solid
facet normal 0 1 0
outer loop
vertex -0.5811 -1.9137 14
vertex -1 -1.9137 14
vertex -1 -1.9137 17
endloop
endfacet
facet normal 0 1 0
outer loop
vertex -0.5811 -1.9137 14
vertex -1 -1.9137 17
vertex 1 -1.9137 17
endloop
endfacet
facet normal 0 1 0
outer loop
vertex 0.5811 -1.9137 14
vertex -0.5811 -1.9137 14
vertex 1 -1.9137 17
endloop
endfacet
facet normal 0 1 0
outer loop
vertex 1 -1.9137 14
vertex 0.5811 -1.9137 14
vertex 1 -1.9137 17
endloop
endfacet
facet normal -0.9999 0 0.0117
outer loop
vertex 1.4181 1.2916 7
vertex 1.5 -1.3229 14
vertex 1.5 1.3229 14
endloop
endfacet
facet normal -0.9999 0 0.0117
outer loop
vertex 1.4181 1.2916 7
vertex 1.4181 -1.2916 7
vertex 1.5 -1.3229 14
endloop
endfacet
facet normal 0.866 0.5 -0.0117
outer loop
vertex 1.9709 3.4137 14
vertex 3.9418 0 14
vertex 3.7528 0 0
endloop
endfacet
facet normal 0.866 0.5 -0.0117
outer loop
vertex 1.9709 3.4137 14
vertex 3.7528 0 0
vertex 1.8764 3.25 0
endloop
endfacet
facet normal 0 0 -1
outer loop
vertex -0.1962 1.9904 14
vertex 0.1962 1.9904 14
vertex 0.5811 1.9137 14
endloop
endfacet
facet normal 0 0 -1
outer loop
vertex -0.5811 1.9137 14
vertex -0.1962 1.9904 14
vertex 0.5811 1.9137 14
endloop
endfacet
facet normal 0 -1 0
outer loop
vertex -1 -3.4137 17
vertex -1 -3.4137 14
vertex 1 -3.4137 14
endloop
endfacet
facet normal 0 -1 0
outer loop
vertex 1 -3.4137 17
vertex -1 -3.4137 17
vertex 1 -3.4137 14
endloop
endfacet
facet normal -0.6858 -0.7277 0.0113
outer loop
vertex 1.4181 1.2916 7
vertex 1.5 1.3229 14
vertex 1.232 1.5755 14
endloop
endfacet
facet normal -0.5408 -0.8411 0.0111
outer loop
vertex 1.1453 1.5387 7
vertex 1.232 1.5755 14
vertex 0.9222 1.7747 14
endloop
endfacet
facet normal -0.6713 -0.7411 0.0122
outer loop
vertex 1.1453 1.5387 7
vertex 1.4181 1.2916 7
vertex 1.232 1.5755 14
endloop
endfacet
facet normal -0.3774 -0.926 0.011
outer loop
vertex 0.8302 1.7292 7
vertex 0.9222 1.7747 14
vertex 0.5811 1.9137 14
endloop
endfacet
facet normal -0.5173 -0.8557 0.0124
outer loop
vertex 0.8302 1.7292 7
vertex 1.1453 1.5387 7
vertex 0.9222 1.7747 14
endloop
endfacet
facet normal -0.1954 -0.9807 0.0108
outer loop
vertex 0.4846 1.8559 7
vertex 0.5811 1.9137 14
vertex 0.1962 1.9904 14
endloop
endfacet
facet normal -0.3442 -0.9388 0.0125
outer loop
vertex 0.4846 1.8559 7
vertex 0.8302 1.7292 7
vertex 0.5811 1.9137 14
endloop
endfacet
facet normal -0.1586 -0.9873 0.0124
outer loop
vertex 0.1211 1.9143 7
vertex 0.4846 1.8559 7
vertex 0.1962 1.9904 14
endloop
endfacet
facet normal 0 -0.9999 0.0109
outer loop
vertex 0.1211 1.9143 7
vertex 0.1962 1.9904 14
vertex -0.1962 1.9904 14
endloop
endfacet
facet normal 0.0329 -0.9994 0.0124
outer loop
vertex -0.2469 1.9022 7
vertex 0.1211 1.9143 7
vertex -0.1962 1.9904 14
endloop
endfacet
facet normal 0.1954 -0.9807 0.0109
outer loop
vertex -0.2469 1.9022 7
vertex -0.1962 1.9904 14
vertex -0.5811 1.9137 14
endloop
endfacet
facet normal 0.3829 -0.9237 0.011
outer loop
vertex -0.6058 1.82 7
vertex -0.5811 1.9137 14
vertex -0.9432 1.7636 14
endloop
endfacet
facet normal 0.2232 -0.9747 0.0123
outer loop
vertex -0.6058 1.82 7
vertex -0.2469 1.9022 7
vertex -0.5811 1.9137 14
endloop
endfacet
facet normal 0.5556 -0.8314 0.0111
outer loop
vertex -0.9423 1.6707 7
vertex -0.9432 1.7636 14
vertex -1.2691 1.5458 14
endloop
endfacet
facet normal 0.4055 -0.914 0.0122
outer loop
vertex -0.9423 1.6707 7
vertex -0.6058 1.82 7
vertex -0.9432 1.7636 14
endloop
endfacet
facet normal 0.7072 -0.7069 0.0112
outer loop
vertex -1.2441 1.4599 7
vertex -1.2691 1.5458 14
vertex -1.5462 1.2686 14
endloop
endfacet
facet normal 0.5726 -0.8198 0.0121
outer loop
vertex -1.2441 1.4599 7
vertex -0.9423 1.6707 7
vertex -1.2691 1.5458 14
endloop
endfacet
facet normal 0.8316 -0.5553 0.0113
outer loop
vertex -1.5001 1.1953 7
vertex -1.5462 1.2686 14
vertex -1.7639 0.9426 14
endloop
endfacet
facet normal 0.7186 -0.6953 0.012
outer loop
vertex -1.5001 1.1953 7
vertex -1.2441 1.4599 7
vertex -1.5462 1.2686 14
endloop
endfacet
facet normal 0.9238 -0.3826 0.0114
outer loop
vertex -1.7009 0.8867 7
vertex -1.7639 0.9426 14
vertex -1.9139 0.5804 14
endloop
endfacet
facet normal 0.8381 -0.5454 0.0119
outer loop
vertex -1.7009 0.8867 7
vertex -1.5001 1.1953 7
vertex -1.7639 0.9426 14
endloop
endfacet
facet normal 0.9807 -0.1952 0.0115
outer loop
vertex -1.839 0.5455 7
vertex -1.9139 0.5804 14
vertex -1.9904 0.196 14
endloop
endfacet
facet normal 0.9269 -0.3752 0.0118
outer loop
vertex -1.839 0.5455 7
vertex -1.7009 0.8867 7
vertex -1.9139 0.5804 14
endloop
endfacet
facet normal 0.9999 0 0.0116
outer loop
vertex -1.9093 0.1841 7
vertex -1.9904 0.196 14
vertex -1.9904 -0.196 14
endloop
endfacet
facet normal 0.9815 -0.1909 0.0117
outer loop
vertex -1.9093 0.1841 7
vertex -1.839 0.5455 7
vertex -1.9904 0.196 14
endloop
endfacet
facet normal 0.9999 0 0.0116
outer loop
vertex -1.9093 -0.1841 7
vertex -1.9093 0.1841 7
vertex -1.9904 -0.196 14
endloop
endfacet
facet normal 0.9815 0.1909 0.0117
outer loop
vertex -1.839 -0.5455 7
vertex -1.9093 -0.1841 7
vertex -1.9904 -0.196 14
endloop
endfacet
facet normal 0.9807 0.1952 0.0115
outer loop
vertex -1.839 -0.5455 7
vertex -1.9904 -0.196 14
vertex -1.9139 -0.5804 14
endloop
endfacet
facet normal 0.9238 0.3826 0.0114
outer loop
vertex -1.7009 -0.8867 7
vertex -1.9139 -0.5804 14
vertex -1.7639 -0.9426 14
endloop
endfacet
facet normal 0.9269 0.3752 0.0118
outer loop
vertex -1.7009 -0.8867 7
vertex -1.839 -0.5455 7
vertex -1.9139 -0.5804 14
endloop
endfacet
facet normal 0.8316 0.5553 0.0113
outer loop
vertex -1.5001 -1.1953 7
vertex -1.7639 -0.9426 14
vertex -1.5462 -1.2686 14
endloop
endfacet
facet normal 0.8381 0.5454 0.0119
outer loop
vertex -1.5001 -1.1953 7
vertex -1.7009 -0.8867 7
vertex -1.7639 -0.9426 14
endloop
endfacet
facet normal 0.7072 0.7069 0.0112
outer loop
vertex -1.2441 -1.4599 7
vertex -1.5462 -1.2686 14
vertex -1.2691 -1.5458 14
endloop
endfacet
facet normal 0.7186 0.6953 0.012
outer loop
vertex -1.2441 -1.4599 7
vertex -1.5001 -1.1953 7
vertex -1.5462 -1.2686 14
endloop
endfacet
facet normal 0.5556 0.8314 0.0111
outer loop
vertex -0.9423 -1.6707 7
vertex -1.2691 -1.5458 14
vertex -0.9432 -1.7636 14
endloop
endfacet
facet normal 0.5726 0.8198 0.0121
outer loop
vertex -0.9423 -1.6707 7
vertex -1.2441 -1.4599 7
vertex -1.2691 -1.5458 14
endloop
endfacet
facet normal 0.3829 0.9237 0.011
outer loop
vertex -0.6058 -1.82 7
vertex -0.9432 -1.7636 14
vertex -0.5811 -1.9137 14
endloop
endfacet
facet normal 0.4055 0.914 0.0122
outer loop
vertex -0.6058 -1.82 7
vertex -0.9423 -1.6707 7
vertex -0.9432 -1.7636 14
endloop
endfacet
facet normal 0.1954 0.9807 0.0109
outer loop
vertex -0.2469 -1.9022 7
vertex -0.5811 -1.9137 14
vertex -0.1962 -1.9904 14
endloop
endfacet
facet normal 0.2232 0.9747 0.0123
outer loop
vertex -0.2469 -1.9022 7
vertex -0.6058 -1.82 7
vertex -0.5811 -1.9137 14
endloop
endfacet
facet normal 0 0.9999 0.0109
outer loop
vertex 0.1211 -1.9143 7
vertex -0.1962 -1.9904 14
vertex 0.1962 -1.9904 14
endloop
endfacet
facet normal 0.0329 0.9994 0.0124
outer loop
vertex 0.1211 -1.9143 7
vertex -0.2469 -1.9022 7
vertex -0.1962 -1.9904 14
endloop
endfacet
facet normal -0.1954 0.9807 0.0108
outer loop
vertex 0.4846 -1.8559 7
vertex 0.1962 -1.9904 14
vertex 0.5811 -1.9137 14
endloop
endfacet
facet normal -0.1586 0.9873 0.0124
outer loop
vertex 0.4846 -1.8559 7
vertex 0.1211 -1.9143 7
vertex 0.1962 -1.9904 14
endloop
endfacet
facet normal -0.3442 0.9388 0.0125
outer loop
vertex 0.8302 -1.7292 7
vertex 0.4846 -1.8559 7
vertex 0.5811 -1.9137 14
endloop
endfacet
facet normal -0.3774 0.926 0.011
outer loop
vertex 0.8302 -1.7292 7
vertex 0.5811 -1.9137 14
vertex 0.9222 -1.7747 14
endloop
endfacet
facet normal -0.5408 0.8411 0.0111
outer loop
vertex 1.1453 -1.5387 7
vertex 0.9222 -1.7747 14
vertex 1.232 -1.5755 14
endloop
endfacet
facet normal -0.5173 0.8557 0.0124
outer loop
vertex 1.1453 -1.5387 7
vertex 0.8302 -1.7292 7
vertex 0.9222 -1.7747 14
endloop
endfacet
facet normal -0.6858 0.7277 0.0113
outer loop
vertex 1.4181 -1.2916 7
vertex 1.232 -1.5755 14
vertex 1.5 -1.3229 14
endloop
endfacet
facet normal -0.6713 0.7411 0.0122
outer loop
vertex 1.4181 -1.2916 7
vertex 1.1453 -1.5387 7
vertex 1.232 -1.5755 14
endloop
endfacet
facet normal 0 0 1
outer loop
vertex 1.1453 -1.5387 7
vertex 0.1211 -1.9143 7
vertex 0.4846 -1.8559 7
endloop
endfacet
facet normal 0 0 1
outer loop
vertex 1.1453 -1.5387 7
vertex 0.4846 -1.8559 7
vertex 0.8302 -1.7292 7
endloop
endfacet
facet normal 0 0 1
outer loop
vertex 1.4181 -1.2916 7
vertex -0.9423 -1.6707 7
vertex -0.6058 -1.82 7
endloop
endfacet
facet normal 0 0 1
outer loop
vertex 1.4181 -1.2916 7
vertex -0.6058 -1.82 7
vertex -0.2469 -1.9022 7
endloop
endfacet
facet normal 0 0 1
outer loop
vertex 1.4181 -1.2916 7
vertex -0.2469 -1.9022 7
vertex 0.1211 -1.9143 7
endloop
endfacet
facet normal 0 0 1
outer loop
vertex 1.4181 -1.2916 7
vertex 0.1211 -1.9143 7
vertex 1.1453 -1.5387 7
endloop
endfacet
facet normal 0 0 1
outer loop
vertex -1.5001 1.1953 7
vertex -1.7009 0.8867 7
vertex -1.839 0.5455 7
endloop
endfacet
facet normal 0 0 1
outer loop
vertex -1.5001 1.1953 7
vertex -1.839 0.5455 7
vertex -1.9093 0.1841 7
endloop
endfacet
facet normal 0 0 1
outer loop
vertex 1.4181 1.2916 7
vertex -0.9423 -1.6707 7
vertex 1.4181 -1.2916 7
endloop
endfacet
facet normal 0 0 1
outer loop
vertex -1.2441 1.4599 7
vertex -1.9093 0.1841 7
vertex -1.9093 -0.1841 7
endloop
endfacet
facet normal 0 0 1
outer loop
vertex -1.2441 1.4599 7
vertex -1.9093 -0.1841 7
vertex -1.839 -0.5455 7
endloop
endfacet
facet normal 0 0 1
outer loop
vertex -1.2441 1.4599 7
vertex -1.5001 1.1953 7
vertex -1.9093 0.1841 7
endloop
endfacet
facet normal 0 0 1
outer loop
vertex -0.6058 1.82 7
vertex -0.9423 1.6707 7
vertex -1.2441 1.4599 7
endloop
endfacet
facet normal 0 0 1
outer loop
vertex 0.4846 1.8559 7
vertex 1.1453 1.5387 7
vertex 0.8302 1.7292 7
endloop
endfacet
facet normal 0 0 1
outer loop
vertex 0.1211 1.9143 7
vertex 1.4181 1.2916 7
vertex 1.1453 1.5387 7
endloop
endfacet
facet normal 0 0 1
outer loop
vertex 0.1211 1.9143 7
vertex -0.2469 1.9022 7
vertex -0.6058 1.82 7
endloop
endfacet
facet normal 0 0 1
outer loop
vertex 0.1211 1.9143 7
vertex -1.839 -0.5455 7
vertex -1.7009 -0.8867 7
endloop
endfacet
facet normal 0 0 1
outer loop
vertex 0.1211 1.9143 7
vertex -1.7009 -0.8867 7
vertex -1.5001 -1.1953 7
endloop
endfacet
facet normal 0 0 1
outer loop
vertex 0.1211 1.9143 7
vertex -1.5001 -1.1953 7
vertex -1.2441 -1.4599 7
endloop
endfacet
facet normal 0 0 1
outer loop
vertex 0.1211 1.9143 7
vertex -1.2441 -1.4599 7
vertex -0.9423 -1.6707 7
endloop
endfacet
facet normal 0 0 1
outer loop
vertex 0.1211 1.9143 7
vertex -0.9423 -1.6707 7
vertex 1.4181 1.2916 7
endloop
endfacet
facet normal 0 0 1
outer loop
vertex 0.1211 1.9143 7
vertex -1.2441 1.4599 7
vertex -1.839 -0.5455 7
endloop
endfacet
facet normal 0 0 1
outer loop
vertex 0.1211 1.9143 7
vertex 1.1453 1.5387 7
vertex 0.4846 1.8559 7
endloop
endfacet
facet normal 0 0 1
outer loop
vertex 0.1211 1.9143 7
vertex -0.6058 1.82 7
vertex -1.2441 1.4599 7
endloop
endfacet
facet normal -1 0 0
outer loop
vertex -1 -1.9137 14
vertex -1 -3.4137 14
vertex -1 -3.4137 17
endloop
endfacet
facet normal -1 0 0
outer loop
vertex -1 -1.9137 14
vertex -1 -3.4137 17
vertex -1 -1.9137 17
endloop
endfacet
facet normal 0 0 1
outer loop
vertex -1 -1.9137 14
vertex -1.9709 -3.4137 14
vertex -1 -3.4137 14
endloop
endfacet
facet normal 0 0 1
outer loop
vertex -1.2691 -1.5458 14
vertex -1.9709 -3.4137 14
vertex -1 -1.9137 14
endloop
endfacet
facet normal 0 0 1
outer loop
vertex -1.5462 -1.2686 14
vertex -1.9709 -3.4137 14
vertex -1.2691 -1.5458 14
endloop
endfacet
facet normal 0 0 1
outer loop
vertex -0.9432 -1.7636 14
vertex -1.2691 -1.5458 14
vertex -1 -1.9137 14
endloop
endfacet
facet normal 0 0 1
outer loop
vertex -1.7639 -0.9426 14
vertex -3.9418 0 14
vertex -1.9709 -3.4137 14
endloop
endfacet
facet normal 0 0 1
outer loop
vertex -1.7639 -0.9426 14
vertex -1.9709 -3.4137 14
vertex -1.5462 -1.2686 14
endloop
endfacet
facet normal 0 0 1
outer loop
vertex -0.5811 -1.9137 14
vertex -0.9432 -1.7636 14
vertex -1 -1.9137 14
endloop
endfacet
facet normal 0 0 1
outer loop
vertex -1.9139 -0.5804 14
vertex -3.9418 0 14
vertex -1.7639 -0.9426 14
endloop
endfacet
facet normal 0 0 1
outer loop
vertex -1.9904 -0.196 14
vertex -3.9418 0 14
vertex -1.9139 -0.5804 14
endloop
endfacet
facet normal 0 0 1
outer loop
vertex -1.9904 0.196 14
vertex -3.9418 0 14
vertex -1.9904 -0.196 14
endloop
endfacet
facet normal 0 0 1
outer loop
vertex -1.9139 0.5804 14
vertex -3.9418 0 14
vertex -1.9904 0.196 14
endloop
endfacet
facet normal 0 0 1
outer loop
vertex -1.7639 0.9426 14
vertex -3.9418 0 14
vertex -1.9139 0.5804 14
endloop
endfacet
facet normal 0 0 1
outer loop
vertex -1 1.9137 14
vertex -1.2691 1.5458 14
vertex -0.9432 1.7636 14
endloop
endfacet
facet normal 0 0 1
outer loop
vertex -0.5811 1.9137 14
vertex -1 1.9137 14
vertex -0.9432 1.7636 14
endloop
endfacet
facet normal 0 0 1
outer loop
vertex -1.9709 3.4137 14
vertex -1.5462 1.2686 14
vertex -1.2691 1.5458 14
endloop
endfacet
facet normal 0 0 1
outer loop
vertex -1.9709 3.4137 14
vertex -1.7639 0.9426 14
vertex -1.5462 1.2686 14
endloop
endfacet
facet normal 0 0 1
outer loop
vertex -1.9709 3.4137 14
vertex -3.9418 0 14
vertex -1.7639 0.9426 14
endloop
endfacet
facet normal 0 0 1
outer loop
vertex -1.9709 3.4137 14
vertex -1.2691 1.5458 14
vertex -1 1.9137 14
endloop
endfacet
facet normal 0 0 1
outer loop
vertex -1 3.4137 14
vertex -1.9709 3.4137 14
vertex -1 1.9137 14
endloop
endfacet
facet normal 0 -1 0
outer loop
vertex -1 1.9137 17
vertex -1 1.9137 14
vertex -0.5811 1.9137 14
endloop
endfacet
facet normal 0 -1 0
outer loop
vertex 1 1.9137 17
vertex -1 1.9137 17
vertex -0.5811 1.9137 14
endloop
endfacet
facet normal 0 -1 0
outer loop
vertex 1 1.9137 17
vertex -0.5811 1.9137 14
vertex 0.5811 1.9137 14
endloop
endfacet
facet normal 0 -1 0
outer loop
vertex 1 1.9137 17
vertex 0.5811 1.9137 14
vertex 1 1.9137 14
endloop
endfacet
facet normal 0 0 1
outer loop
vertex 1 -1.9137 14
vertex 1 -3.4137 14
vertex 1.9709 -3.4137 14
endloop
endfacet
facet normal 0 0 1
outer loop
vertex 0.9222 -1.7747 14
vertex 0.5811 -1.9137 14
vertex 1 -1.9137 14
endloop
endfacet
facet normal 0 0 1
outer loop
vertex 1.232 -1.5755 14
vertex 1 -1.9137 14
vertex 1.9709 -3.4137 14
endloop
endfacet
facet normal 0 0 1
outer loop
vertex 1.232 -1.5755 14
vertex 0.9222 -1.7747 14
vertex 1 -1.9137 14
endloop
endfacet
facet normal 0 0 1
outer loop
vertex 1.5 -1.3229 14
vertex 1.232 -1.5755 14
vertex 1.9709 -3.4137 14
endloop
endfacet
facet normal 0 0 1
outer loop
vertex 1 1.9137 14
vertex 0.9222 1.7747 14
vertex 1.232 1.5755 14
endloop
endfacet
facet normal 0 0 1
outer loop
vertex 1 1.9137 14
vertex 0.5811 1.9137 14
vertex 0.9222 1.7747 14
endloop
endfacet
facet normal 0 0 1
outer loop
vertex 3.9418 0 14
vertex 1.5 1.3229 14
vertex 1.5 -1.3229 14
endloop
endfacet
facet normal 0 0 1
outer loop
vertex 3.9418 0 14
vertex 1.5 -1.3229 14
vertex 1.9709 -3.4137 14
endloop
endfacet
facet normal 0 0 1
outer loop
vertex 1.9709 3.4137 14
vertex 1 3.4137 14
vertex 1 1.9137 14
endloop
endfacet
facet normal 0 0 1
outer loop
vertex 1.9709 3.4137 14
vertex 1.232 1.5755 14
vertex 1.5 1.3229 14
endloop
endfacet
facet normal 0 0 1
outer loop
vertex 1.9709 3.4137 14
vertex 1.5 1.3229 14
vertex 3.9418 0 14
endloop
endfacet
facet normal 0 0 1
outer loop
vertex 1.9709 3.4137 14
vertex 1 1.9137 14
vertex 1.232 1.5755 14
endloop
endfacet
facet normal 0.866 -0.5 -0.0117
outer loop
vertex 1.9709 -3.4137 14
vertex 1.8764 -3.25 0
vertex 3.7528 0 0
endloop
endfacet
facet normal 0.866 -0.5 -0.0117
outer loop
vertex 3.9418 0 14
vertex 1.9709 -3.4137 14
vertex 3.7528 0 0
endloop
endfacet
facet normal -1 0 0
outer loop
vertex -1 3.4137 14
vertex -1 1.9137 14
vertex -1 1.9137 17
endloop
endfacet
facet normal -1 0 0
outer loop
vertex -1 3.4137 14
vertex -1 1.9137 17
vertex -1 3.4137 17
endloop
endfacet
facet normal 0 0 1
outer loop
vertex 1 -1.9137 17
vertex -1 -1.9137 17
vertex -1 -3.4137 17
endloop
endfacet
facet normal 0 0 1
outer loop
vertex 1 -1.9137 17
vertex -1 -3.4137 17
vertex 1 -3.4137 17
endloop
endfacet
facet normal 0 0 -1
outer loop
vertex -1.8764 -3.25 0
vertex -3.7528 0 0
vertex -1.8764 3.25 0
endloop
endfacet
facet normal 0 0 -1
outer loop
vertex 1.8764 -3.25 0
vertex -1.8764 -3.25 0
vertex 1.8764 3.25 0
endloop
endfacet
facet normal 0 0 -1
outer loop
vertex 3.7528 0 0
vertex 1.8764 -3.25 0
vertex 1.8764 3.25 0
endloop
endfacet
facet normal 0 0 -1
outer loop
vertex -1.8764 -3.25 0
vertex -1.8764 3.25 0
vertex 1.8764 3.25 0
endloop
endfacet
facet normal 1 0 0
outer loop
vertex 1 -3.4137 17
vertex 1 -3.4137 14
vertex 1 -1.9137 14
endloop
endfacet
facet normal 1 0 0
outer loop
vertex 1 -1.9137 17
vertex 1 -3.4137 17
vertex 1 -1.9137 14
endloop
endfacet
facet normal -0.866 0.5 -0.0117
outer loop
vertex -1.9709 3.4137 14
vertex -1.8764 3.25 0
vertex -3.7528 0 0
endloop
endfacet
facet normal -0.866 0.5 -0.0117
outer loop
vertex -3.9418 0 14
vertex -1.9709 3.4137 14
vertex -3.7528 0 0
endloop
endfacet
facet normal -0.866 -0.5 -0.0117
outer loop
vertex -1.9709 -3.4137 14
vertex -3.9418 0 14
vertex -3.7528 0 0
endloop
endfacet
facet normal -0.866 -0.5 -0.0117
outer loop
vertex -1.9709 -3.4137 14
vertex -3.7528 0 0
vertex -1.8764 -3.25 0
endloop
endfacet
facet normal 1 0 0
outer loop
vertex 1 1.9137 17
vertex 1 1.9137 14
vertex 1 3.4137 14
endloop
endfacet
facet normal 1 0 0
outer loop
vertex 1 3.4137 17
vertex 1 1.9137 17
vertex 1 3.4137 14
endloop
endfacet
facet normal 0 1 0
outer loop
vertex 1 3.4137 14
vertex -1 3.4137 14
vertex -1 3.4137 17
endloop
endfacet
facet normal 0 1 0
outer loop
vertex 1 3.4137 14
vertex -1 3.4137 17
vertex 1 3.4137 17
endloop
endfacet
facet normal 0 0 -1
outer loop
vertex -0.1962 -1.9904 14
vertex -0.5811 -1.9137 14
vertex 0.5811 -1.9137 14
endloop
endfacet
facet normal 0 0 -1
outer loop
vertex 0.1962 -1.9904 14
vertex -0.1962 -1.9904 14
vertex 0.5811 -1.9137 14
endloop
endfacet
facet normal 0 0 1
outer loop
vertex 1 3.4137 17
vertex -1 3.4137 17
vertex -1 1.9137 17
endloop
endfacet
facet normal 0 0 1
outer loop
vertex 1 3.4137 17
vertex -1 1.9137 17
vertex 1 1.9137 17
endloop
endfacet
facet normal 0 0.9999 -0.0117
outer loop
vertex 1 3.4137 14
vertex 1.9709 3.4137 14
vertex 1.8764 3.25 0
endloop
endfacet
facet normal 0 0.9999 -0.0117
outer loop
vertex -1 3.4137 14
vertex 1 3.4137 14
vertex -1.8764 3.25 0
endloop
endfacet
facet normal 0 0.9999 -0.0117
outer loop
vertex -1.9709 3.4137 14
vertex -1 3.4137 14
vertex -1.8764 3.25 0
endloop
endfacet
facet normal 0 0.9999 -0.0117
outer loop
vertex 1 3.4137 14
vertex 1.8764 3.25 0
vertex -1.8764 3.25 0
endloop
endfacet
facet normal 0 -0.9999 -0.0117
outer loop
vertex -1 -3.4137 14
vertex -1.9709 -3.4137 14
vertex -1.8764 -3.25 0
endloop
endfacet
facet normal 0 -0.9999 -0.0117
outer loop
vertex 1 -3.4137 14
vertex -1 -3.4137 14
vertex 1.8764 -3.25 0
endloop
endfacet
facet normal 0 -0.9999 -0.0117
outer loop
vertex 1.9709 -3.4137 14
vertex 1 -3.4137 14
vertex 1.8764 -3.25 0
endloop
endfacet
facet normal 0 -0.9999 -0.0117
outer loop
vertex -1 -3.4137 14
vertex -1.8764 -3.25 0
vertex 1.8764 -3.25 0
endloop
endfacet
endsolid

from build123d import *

# Parameters (mm, degrees)
EXTRUDE_1_DEPTH     = 14
EXTRUDE_1_DRAFT     = -0.67
CUT_EXTRUDE_1_DEPTH = 7
CUT_EXTRUDE_1_TAPER = 0.67
SKETCH_3_W          = 2
SKETCH_3_H          = 1.5
EXTRUDE_2_DEPTH     = 3


with BuildPart() as part:
    # 草图1 → 凸台-拉伸1 (with draft: the straight prism first)
    with BuildSketch(Plane.XY):
        Polygon((1.876388375, 3.25), (-1.876388375, 3.25), (-3.75277675, 0), (-1.876388375, -3.25), (1.876388375, -3.25), (3.75277675, 0), align=None)
    extrude(amount=EXTRUDE_1_DEPTH)
    # 凸台-拉伸1: the draft: its side faces are tilted about the plane it starts from
    extrude_1_sides = [part.faces().sort_by_distance(p)[0] for p in [
        (0, 3.25, 7),
        (-2.814582562, 1.625, 7),
        (-2.814582562, -1.625, 7),
        (0, -3.25, 7),
        (2.814582562, -1.625, 7),
        (2.814582562, 1.625, 7),
    ]]
    draft(extrude_1_sides, Plane.XY, EXTRUDE_1_DRAFT)

    # 草图2 → 切除-拉伸1 (cut)
    with BuildSketch(Plane.XY.offset(14)):
        with BuildLine():
            Line((1.5, -1.322875656), (1.5, 1.322875656))
            ThreePointArc((1.5, 1.322875656), (-2, 0), (1.5, -1.322875656))
        make_face()
    extrude(amount=-CUT_EXTRUDE_1_DEPTH, taper=CUT_EXTRUDE_1_TAPER, mode=Mode.SUBTRACT)

    # 草图3 → 凸台-拉伸2 (add)
    with BuildSketch(Plane.XY.offset(14)):
        with Locations((0, 2.663719346)):
            Rectangle(SKETCH_3_W, SKETCH_3_H)
        with Locations((0, -2.663719346)):
            Rectangle(SKETCH_3_W, SKETCH_3_H)
    extrude(amount=EXTRUDE_2_DEPTH)


solid = part.part
